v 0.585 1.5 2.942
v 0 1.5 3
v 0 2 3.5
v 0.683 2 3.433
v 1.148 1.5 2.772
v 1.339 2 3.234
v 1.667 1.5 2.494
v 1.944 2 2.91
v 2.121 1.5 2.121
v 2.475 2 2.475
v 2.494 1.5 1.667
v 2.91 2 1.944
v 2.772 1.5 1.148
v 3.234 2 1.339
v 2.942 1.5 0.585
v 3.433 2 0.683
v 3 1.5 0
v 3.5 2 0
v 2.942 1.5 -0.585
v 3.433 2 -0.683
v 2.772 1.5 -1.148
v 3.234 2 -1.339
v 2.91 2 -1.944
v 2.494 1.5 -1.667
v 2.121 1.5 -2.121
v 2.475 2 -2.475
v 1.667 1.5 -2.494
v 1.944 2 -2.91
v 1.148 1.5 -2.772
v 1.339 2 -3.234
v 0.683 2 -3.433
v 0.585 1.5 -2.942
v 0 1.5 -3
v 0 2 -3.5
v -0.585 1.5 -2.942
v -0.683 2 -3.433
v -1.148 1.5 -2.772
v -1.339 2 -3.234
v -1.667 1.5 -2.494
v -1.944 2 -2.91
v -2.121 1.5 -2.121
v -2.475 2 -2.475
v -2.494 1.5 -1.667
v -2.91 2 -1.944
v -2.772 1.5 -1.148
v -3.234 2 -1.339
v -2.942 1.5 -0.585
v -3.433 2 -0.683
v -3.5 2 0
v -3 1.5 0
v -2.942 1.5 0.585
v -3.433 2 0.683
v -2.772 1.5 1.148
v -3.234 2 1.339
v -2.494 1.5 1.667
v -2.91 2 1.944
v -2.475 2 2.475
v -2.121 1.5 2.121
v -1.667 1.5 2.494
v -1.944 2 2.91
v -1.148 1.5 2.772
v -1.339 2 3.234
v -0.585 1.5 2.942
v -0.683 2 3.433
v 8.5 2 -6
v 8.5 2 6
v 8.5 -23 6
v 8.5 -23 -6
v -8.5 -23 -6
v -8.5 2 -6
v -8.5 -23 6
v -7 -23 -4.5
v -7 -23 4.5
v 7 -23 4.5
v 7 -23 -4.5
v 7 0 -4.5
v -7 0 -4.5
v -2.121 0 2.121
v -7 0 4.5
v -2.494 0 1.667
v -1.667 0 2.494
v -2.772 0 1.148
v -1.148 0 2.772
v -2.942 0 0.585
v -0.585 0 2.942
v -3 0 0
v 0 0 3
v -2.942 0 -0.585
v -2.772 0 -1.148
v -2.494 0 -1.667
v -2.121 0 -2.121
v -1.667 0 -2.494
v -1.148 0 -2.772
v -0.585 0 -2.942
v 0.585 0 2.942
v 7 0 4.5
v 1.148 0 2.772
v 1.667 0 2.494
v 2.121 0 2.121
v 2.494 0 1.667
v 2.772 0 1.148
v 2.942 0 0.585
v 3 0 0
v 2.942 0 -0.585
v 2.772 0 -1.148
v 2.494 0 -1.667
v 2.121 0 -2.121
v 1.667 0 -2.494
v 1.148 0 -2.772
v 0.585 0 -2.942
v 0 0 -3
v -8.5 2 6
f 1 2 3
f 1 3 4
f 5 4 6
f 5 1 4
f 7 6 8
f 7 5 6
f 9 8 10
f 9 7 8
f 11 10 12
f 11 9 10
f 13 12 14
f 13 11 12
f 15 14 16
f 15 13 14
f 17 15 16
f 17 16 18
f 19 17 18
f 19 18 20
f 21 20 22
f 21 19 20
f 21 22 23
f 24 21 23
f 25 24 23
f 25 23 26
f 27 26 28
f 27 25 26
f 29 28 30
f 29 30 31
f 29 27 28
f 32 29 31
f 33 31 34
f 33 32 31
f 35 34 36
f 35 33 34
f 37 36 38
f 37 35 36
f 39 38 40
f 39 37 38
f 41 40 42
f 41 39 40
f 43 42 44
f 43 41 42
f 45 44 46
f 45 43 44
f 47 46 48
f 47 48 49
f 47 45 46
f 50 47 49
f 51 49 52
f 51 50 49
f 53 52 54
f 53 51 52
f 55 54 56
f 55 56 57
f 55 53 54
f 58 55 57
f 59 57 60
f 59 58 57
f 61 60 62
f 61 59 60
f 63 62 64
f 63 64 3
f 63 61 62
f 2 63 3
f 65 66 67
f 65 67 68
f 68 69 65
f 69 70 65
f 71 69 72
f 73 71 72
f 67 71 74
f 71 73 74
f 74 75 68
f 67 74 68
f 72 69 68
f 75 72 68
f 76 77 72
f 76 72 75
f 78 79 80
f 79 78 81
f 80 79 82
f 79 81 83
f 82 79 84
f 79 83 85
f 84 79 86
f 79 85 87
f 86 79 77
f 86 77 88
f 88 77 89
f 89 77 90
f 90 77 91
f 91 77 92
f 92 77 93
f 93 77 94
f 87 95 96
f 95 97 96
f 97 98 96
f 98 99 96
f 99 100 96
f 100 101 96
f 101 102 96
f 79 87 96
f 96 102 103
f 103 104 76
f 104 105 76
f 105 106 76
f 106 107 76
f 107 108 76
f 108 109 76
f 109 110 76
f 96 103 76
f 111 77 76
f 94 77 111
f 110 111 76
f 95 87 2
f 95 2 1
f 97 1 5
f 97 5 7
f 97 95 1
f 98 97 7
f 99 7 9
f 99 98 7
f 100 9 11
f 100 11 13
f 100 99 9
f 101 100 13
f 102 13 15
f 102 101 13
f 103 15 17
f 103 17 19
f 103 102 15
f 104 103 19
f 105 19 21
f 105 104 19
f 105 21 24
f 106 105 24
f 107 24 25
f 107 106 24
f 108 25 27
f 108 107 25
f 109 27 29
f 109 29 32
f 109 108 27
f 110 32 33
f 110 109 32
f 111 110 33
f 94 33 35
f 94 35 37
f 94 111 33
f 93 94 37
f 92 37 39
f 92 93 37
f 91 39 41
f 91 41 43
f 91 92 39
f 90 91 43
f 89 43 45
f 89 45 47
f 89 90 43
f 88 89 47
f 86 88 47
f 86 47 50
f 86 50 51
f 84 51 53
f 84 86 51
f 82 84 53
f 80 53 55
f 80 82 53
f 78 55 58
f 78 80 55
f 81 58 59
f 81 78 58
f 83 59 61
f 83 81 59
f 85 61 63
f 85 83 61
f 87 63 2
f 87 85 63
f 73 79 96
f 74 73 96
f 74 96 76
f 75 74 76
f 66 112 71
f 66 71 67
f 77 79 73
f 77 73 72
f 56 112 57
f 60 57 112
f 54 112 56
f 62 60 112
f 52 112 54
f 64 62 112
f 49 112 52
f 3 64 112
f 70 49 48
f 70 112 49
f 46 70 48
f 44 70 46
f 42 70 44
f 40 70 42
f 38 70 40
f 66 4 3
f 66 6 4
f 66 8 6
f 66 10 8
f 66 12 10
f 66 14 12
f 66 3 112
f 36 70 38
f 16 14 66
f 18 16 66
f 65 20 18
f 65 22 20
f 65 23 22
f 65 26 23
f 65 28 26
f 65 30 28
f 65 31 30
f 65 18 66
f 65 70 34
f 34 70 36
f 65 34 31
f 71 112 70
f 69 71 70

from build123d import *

# Parameters (mm, degrees)
SKETCH1_W           = 17
SKETCH1_H           = 12
SKETCH1_R           = 3
BOSS_EXTRUDE1_DEPTH = 2
SKETCH2_W           = 17
SKETCH2_H           = 12
SKETCH2_W_2         = 14
SKETCH2_H_2         = 9
BOSS_EXTRUDE2_DEPTH = 23
CHAMFER1_SIZE       = 0.5


with BuildPart() as part:
    # Sketch1 → Boss-Extrude1 (new body)
    with BuildSketch(Plane(origin=(0, 0, 0), x_dir=(1, 0, 0), z_dir=(0, 1, 0))):
        Rectangle(SKETCH1_W, SKETCH1_H)
        with Locations(Location((0, 0, 0), (0, 0, 270))):
            Circle(SKETCH1_R, mode=Mode.SUBTRACT)
    extrude(amount=BOSS_EXTRUDE1_DEPTH)

    # Sketch2 → Boss-Extrude2 (add)
    with BuildSketch(Plane(origin=(0, 0, 0), x_dir=(1, 0, 0), z_dir=(0, 1, 0))):
        Rectangle(SKETCH2_W, SKETCH2_H)
        Rectangle(SKETCH2_W_2, SKETCH2_H_2, mode=Mode.SUBTRACT)
    extrude(amount=-BOSS_EXTRUDE2_DEPTH)

    # Chamfer1
    chamfer1_edges = [part.edges().sort_by_distance(p)[0] for p in [
        (0, 2, -3),
    ]]
    chamfer(chamfer1_edges, length=CHAMFER1_SIZE)


solid = part.part
